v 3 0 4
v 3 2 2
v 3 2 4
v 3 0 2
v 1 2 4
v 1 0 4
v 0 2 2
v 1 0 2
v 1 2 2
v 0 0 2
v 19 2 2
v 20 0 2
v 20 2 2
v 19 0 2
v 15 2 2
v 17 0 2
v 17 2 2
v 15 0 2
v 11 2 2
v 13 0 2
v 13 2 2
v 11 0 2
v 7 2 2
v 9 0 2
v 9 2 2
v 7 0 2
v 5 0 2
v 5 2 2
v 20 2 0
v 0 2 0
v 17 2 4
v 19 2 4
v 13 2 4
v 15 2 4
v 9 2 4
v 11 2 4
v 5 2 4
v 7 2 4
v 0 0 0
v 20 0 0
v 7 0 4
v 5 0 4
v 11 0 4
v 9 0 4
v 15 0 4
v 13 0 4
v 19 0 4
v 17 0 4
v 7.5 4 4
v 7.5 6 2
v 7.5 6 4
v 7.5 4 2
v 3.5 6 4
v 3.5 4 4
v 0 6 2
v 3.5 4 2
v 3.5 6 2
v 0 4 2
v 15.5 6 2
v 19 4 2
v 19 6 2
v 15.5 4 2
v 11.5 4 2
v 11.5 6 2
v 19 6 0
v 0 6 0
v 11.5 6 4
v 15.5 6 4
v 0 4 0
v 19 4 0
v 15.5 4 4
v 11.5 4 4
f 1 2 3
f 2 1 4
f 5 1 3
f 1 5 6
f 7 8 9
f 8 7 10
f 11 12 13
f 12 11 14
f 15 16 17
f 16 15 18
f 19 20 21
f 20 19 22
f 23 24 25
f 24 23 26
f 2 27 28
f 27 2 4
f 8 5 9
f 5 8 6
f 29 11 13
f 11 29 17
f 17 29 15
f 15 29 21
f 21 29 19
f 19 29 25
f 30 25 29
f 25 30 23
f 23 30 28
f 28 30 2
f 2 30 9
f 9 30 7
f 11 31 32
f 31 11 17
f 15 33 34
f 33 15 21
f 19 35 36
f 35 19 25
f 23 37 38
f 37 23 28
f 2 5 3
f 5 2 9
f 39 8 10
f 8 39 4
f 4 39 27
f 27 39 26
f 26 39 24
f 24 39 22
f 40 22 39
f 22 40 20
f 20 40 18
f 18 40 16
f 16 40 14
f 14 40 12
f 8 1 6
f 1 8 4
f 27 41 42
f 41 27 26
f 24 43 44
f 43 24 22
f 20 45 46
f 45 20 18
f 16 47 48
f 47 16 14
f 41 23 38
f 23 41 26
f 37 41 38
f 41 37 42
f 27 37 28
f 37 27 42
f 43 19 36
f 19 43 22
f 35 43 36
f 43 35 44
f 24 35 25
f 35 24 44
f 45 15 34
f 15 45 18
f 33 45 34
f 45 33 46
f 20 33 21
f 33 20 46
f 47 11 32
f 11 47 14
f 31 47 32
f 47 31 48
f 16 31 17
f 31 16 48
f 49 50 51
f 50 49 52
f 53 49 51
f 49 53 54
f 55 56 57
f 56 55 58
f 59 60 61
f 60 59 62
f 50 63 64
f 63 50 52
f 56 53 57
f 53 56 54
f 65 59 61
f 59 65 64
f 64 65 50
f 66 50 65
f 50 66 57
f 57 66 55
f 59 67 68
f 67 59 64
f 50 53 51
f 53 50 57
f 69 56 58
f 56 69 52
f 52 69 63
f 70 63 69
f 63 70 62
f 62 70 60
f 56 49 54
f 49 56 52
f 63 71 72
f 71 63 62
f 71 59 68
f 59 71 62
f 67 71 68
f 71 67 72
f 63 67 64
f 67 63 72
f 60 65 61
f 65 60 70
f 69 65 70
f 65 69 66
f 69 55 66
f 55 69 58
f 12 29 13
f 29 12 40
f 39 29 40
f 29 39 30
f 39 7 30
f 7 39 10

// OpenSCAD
/*This library is placed into the public domain by NMR_Scientist.

Version: R1
Title: Utility
Description: Miscellaneous utility modules I developed over the course of several projects to reuse common operations that were seen over various models,

History:
* ??/??/2024 - R1 - First release to be with a model whenever it is released. 
*/

$fa = 1;
$fs = 0.1;

use <MCAD/regular_shapes.scad>;

//Move objects in the x-axis.
module move_x (x)
{
    translate([x,0,0])
    {
        children();
    }
}

//Move objects in the y-axis
module move_y (y)
{
    translate([0,y,0])
    {
        children();
    }
}

//Move objects in the z-ax
module move_z (z)
{
    translate([0,0,z])
    {
        children();
    }
}

//Move objects by a given point in all direction. -1 would means moving to the left, moving back, and moving down by one point. 
module move_by(point)
{
    translate([point,point,point])
    {
        children();
    }
}

//Exactly like move_by, but a negation. Named for its very common use in adding tolerance to objects.
module move_by_margin(m)
{
    move_by(-m)
    {
        children();
    }
}

//A cylinder rotated to its side.
module hor_cylinder(width,r,r)
{
    move_y(r)
        move_z(r)
            rotate([0,90,0])
            {
                cylinder(width,r,r);
            }
}

module hor_cylinder_y(length,r)
{
    translate([r * 2,0,0])
    {
        rotate([0,0,90])
        {
            hor_cylinder(length,r);
        }
    }
}


//Cut a object at a given height and then move that object down, usually to zero if the object was placed at zero height.
module hor_cut(width,length,height)
{
    translate([0,0,-height])
    {
        difference()
        {
            children();
            translate([-1,-1,-1])
            {
                cube([width + 2,length + 2,height + 1]);
            }
        }
    }
}

function bevel_radius(length) = length * 2 / 3;
function bevel_height(r) = r * sqrt(3)/2;

//Bevel at 45 degree slop up, facing, back, then extrude upward by height.
module bevel_up_back_45(width,length,height)
{
    r = bevel_radius(length);
    z = bevel_height(r);
    m = 0.1;
    m_2 = m * 2;
    difference()
    {
        translate([0,r / 2,z])
        {
            rotate([0,90,0])
            {
                triangle_prism(width,r);
            }   
        }
        // Cut off to the required height.
        move_x(-m)
            move_y(-m)
                move_z(height)
                   cube([width + m,length + m,z * 2 - height]);
    }
    //If cutting off isn't happening simply add height.
    if (height >= z)
    {
        move_z(z)
        {
            cube([width,length,height - z]);
        }
    }
}

//Center an object against a particular width of another object.
module center(centering_w,target_w)
{
    x = (target_w - centering_w) / 2;
    translate([x,0,0])
    {
        children();
    }
}

//Move object to a certain value of x, but also account for the object size, such that the object is place before the point x. For a postive value of x, that is before the x, for a negative value of x, that is next to x. Useful for dimensional accurate placement. 
module move_object_x(x,r)
{
    diameter = r * 2;
    if (abs(x) < diameter)
    {
        echo("Cannot move!");
    }
    else
    {
        if (x > 0)
        {
            move_x(x - diameter)
            {
                children();
            }
        }
        else if (x < 0)
        {
            move_x(x + diameter)
                children();
        }
    }
}


//Move object to a certain value of z, but also account for the object size, such that the object is place before the point z. For a postive value of z, that is below of z, for a negative value of z, that is above z. Useful for dimensional accurate placement. 
module move_object_z(z, r)
{
    diameter = r * 2;
    if (abs(z) < diameter)
    {
        echo("Cannot move!");
    }
    else
    {
        if (z > 0)
        {
            move_z(z - diameter)
            {
                children();
            }
        }
        else if (z < 0)
        {
            move_z(z + diameter)
                children();
        }
    }
}


//Generaate all notches in a castellation at the same time, and space each notch for the length of the notch.
module notches(n, multipler)
{
    for (x = [1:n])
    {   
        final_x = (x - 1) * multipler;
        move_x(final_x)
        {
            if ((x - 1) % 2 == 0)
            {
               children();
            }
        }
    }
}

//Get the total width of the Castellation, starting with the first and last notches.
function CastellateTotalW(w,size) = (w - 1) % 2 == 1 ? (w - 1) * size.x : w * size.x;


//Center the resulting castellation of a certain cuboid size. 
module castellate(width,size, m = 0)
{
    total_notches = floor(width / size.x);
    total_w = CastellateTotalW(total_notches,size);
    center(total_w,width)
    {
        notches(total_notches,size.x)
        {
            move_x(m)
            {
                shrink = [size.x - (m * 2),size.y,size.z];
                cube(shrink);
            }
        }
    }

}


cube2 = [2,2,2];
d = 20;
cube([d,2,2]);
move_z(2)
    castellate(d,cube2);
    
move_y(4)
{
    cube3 = [4,2,2];
    d = 19;
    cube([d,2,2]);
    move_z(2)
    castellate(d,cube3);
}
